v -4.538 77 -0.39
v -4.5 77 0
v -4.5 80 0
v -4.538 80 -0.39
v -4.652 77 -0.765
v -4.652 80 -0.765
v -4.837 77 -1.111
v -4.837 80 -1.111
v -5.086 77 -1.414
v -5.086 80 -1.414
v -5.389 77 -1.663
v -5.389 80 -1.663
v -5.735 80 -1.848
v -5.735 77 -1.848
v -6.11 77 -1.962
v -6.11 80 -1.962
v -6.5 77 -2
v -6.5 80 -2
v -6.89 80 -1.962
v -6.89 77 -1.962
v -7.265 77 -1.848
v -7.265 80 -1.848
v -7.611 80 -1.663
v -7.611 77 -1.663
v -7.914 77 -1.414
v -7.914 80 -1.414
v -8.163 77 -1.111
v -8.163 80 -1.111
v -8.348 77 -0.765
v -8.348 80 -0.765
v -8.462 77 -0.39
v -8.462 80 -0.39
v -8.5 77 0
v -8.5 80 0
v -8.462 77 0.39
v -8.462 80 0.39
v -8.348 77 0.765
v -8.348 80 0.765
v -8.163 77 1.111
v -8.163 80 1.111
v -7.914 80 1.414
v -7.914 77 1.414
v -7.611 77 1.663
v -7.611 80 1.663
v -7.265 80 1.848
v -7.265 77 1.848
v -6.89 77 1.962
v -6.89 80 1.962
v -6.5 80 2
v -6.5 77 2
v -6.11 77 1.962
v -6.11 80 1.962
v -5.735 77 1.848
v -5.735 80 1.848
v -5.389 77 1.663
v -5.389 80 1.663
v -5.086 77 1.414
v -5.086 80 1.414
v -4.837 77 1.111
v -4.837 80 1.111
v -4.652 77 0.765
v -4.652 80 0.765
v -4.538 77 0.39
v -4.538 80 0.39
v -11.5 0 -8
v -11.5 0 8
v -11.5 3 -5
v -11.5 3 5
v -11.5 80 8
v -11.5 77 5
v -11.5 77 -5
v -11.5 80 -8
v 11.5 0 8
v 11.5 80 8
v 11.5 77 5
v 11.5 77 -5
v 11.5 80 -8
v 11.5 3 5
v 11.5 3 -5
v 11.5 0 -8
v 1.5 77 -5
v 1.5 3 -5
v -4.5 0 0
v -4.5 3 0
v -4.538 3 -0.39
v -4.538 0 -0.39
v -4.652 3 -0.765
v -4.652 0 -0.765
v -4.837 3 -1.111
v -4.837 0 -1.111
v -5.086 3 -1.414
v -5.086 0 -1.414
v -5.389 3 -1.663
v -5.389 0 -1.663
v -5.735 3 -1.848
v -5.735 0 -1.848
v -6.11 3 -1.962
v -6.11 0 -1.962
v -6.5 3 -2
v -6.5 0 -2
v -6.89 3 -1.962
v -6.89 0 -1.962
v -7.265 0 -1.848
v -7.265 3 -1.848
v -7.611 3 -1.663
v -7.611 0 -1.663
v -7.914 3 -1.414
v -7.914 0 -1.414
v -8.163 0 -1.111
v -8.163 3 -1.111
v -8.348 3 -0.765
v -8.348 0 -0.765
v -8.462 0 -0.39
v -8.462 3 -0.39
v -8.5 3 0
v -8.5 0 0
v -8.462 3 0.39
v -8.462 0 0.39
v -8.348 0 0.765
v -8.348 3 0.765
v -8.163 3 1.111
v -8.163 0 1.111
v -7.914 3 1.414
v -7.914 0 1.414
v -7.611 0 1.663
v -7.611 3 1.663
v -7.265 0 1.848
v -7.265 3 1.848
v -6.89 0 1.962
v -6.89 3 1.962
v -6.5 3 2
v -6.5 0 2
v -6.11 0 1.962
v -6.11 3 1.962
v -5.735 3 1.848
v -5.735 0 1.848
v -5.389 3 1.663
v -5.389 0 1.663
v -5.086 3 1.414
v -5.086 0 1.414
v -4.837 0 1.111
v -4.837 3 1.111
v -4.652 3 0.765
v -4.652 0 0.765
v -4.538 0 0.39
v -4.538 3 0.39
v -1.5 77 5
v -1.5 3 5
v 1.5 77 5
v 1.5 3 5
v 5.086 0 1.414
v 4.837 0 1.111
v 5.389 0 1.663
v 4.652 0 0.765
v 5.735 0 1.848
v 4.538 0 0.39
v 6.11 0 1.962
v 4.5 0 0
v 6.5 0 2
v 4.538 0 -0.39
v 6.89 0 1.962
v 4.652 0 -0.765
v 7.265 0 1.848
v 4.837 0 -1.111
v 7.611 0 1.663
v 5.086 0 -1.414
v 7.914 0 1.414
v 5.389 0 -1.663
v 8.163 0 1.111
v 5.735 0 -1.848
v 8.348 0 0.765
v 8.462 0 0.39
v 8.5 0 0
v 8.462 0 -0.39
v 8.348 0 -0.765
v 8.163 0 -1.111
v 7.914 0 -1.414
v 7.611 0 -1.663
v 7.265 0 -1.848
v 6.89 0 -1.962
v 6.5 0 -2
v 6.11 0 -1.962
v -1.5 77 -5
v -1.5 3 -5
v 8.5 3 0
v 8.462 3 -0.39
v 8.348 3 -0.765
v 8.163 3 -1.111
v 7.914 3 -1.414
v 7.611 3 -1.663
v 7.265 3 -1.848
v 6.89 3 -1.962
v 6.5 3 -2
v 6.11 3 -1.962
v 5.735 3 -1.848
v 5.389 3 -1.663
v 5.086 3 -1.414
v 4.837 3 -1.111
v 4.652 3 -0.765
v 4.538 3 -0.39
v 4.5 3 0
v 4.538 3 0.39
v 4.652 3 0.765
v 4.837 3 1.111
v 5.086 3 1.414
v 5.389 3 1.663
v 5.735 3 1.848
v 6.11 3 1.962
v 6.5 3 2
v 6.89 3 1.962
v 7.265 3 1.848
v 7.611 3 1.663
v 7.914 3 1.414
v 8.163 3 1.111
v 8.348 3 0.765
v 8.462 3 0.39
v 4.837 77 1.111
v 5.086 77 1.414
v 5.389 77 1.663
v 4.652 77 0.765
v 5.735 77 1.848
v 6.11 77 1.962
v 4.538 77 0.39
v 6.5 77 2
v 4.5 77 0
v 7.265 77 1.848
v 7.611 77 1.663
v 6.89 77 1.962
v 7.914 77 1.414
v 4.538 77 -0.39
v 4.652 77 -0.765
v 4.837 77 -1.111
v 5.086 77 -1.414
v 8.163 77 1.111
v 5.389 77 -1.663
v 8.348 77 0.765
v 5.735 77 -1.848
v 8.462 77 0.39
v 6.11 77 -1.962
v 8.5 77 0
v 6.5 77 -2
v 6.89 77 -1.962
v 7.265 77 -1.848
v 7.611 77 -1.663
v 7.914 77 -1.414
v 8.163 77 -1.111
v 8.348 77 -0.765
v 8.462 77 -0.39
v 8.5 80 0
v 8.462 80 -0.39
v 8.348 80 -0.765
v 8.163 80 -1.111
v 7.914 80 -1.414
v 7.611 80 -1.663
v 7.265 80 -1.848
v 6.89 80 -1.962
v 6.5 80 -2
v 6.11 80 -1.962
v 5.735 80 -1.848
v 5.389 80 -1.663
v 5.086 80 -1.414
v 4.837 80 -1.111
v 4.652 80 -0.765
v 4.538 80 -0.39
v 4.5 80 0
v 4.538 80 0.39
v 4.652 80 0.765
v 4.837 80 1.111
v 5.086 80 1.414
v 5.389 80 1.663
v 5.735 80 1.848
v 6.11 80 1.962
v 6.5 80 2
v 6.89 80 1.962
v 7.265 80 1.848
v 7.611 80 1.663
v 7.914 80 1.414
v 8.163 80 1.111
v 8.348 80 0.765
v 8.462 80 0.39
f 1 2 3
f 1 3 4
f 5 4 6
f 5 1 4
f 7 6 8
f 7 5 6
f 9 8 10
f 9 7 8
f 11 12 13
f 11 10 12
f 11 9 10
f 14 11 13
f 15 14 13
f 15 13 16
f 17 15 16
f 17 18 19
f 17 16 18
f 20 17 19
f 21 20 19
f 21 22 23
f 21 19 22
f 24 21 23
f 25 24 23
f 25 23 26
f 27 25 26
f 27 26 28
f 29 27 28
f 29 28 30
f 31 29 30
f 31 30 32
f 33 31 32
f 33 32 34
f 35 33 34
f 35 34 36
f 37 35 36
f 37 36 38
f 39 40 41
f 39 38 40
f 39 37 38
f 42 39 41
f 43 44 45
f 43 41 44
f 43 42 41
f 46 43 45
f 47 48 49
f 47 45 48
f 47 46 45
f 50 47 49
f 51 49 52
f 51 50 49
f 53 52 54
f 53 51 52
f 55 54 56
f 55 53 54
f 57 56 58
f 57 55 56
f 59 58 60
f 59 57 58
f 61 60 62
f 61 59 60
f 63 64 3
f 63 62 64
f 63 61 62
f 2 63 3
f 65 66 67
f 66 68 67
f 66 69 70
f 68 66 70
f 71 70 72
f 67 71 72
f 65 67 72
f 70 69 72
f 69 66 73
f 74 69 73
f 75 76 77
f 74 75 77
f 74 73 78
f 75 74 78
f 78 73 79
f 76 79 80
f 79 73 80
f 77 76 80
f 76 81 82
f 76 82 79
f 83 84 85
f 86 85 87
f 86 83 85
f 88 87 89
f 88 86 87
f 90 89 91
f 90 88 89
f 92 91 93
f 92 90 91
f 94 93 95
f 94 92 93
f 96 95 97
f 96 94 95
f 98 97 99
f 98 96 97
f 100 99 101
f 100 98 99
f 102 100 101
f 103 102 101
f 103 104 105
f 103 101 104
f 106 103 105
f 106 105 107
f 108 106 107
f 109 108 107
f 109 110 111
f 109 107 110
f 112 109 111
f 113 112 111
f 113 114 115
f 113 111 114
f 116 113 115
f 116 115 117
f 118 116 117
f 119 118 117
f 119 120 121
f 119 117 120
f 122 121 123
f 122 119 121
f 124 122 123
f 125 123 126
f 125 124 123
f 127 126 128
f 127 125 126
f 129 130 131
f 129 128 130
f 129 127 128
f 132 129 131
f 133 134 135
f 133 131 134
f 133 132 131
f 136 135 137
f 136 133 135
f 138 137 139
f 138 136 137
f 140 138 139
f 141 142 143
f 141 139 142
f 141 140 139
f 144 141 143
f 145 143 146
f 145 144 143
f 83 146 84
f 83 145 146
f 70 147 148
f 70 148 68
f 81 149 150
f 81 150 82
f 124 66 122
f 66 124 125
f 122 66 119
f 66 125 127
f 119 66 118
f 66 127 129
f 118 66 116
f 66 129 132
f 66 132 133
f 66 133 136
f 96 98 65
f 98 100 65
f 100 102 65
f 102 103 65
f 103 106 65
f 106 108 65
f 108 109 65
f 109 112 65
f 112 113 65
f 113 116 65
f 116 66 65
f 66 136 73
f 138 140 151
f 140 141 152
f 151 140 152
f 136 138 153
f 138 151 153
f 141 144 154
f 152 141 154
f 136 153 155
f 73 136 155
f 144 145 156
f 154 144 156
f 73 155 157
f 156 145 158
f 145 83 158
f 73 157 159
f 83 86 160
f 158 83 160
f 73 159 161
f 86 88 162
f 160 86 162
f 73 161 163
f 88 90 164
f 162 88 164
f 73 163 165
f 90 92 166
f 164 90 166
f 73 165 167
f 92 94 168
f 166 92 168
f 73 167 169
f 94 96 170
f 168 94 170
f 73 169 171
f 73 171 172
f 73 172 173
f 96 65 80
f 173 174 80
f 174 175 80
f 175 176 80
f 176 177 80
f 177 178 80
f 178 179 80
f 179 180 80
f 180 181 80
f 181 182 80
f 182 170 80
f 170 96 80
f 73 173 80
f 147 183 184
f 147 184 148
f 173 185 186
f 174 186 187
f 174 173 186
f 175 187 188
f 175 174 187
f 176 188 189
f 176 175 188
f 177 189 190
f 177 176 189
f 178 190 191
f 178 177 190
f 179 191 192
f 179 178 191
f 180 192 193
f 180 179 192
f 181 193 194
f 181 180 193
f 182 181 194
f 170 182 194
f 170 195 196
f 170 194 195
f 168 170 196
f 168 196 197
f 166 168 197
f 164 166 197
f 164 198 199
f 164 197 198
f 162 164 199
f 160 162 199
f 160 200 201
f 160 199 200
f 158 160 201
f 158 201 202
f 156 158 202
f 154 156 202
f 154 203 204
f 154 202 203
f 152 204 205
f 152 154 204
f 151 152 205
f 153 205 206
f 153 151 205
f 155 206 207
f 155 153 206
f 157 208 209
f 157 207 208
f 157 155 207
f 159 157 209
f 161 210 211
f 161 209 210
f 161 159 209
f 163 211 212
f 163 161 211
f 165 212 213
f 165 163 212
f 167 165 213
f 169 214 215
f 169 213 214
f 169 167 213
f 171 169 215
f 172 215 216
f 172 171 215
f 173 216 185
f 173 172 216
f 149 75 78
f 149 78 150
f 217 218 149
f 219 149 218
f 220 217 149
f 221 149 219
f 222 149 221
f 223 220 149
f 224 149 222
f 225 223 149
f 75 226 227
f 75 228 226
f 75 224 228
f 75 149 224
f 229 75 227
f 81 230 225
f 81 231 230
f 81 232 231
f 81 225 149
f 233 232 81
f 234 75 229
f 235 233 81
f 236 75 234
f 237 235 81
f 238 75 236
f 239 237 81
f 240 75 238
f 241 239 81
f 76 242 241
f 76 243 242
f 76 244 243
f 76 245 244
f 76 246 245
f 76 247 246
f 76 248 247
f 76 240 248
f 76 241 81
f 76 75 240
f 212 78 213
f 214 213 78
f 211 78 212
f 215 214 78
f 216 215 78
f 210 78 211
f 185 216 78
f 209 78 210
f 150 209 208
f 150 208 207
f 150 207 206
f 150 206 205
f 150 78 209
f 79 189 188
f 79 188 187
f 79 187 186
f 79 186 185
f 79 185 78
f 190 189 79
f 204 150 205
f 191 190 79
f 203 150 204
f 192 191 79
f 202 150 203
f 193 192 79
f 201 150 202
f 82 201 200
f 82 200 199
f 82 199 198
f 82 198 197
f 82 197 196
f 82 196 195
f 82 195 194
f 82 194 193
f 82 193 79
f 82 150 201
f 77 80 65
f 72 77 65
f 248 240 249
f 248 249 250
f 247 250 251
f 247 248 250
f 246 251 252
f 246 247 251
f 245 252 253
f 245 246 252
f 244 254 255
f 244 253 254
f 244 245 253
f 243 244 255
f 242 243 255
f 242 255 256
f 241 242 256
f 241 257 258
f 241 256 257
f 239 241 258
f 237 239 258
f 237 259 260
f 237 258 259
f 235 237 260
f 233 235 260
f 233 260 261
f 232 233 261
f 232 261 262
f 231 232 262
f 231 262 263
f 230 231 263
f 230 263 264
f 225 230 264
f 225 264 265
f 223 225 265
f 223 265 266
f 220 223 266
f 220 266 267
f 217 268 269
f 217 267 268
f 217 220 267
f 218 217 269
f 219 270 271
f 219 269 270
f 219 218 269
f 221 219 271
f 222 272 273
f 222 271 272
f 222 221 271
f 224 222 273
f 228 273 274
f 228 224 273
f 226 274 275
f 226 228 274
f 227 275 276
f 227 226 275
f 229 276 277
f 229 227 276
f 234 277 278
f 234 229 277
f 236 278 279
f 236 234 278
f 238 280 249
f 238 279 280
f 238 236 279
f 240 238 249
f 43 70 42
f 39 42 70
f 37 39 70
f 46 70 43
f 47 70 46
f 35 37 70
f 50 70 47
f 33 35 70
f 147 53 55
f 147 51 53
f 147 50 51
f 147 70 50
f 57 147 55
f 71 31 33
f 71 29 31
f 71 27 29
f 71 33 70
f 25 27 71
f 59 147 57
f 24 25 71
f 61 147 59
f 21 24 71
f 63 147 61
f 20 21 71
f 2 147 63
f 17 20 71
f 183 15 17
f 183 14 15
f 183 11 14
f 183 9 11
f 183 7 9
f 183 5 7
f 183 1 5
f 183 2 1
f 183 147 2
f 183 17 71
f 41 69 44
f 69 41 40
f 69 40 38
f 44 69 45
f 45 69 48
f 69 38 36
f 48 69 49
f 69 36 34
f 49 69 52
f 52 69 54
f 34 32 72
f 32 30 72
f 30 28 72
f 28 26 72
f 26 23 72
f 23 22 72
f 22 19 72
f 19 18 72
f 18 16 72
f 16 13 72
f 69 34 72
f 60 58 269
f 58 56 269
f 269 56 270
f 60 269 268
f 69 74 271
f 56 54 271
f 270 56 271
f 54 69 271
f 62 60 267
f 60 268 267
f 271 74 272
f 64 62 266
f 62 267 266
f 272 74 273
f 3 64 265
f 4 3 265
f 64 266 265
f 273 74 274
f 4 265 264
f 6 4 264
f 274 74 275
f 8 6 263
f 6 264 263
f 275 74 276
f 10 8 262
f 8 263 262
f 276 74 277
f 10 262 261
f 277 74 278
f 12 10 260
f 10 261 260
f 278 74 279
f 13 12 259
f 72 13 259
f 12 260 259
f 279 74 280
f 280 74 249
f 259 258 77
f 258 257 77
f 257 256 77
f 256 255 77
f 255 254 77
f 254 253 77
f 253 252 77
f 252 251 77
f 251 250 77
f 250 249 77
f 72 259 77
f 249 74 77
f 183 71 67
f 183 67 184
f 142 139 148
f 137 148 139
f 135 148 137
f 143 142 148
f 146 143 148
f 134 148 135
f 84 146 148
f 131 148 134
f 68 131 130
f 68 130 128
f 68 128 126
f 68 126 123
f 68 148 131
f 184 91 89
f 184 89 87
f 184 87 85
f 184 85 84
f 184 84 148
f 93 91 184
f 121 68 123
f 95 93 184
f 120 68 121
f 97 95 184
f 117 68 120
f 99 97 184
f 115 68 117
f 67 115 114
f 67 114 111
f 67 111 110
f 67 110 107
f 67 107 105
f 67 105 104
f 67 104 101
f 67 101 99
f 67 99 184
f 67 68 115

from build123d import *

# Parameters (mm, degrees)
EXTRUDE_1_DEPTH          = 80
SKETCH_2_W               = 10
SKETCH_2_H               = 3
EXTRUDE_2_DEPTH          = 11.5
SKETCH_3_R               = 2
CUT_EXTRUDE_2_DEPTH      = 81
CUT_EXTRUDE_2_DEPTH_BACK = 1


with BuildPart() as part:
    # 草图1 → 凸台-拉伸1 (new body)
    with BuildSketch(Plane(origin=(0, 0, 0), x_dir=(1, 0, 0), z_dir=(0, 1, 0))):
        Polygon((11.5, 5), (11.5, 8), (-11.5, 8), (-11.5, 5), (-1.5, 5), (-1.5, -5), (-11.5, -5), (-11.5, -8), (11.5, -8), (11.5, -5), (1.5, -5), (1.5, 5), align=None)
    extrude(amount=EXTRUDE_1_DEPTH)

    # 草图2 → 凸台-拉伸2 (add, symmetric)
    with BuildSketch(Plane(origin=(0, 0, 0), x_dir=(0, 0, -1), z_dir=(1, 0, 0))):
        with Locations((0, 1.5)):
            Rectangle(SKETCH_2_W, SKETCH_2_H)
        with Locations((0, 78.5)):
            Rectangle(SKETCH_2_W, SKETCH_2_H)
    extrude(amount=EXTRUDE_2_DEPTH, both=True)

    # 草图3 → 切除-拉伸2 (cut, two sides)
    with BuildSketch(Plane(origin=(0, 0, 0), x_dir=(1, 0, 0), z_dir=(0, 1, 0))) as cut_extrude_2_sk:
        with Locations((6.5, 0)):
            Circle(SKETCH_3_R)
        with Locations((-6.5, 0)):
            Circle(SKETCH_3_R)
    extrude(amount=CUT_EXTRUDE_2_DEPTH, mode=Mode.SUBTRACT)
    extrude(cut_extrude_2_sk.sketch, amount=-CUT_EXTRUDE_2_DEPTH_BACK, mode=Mode.SUBTRACT)


solid = part.part
